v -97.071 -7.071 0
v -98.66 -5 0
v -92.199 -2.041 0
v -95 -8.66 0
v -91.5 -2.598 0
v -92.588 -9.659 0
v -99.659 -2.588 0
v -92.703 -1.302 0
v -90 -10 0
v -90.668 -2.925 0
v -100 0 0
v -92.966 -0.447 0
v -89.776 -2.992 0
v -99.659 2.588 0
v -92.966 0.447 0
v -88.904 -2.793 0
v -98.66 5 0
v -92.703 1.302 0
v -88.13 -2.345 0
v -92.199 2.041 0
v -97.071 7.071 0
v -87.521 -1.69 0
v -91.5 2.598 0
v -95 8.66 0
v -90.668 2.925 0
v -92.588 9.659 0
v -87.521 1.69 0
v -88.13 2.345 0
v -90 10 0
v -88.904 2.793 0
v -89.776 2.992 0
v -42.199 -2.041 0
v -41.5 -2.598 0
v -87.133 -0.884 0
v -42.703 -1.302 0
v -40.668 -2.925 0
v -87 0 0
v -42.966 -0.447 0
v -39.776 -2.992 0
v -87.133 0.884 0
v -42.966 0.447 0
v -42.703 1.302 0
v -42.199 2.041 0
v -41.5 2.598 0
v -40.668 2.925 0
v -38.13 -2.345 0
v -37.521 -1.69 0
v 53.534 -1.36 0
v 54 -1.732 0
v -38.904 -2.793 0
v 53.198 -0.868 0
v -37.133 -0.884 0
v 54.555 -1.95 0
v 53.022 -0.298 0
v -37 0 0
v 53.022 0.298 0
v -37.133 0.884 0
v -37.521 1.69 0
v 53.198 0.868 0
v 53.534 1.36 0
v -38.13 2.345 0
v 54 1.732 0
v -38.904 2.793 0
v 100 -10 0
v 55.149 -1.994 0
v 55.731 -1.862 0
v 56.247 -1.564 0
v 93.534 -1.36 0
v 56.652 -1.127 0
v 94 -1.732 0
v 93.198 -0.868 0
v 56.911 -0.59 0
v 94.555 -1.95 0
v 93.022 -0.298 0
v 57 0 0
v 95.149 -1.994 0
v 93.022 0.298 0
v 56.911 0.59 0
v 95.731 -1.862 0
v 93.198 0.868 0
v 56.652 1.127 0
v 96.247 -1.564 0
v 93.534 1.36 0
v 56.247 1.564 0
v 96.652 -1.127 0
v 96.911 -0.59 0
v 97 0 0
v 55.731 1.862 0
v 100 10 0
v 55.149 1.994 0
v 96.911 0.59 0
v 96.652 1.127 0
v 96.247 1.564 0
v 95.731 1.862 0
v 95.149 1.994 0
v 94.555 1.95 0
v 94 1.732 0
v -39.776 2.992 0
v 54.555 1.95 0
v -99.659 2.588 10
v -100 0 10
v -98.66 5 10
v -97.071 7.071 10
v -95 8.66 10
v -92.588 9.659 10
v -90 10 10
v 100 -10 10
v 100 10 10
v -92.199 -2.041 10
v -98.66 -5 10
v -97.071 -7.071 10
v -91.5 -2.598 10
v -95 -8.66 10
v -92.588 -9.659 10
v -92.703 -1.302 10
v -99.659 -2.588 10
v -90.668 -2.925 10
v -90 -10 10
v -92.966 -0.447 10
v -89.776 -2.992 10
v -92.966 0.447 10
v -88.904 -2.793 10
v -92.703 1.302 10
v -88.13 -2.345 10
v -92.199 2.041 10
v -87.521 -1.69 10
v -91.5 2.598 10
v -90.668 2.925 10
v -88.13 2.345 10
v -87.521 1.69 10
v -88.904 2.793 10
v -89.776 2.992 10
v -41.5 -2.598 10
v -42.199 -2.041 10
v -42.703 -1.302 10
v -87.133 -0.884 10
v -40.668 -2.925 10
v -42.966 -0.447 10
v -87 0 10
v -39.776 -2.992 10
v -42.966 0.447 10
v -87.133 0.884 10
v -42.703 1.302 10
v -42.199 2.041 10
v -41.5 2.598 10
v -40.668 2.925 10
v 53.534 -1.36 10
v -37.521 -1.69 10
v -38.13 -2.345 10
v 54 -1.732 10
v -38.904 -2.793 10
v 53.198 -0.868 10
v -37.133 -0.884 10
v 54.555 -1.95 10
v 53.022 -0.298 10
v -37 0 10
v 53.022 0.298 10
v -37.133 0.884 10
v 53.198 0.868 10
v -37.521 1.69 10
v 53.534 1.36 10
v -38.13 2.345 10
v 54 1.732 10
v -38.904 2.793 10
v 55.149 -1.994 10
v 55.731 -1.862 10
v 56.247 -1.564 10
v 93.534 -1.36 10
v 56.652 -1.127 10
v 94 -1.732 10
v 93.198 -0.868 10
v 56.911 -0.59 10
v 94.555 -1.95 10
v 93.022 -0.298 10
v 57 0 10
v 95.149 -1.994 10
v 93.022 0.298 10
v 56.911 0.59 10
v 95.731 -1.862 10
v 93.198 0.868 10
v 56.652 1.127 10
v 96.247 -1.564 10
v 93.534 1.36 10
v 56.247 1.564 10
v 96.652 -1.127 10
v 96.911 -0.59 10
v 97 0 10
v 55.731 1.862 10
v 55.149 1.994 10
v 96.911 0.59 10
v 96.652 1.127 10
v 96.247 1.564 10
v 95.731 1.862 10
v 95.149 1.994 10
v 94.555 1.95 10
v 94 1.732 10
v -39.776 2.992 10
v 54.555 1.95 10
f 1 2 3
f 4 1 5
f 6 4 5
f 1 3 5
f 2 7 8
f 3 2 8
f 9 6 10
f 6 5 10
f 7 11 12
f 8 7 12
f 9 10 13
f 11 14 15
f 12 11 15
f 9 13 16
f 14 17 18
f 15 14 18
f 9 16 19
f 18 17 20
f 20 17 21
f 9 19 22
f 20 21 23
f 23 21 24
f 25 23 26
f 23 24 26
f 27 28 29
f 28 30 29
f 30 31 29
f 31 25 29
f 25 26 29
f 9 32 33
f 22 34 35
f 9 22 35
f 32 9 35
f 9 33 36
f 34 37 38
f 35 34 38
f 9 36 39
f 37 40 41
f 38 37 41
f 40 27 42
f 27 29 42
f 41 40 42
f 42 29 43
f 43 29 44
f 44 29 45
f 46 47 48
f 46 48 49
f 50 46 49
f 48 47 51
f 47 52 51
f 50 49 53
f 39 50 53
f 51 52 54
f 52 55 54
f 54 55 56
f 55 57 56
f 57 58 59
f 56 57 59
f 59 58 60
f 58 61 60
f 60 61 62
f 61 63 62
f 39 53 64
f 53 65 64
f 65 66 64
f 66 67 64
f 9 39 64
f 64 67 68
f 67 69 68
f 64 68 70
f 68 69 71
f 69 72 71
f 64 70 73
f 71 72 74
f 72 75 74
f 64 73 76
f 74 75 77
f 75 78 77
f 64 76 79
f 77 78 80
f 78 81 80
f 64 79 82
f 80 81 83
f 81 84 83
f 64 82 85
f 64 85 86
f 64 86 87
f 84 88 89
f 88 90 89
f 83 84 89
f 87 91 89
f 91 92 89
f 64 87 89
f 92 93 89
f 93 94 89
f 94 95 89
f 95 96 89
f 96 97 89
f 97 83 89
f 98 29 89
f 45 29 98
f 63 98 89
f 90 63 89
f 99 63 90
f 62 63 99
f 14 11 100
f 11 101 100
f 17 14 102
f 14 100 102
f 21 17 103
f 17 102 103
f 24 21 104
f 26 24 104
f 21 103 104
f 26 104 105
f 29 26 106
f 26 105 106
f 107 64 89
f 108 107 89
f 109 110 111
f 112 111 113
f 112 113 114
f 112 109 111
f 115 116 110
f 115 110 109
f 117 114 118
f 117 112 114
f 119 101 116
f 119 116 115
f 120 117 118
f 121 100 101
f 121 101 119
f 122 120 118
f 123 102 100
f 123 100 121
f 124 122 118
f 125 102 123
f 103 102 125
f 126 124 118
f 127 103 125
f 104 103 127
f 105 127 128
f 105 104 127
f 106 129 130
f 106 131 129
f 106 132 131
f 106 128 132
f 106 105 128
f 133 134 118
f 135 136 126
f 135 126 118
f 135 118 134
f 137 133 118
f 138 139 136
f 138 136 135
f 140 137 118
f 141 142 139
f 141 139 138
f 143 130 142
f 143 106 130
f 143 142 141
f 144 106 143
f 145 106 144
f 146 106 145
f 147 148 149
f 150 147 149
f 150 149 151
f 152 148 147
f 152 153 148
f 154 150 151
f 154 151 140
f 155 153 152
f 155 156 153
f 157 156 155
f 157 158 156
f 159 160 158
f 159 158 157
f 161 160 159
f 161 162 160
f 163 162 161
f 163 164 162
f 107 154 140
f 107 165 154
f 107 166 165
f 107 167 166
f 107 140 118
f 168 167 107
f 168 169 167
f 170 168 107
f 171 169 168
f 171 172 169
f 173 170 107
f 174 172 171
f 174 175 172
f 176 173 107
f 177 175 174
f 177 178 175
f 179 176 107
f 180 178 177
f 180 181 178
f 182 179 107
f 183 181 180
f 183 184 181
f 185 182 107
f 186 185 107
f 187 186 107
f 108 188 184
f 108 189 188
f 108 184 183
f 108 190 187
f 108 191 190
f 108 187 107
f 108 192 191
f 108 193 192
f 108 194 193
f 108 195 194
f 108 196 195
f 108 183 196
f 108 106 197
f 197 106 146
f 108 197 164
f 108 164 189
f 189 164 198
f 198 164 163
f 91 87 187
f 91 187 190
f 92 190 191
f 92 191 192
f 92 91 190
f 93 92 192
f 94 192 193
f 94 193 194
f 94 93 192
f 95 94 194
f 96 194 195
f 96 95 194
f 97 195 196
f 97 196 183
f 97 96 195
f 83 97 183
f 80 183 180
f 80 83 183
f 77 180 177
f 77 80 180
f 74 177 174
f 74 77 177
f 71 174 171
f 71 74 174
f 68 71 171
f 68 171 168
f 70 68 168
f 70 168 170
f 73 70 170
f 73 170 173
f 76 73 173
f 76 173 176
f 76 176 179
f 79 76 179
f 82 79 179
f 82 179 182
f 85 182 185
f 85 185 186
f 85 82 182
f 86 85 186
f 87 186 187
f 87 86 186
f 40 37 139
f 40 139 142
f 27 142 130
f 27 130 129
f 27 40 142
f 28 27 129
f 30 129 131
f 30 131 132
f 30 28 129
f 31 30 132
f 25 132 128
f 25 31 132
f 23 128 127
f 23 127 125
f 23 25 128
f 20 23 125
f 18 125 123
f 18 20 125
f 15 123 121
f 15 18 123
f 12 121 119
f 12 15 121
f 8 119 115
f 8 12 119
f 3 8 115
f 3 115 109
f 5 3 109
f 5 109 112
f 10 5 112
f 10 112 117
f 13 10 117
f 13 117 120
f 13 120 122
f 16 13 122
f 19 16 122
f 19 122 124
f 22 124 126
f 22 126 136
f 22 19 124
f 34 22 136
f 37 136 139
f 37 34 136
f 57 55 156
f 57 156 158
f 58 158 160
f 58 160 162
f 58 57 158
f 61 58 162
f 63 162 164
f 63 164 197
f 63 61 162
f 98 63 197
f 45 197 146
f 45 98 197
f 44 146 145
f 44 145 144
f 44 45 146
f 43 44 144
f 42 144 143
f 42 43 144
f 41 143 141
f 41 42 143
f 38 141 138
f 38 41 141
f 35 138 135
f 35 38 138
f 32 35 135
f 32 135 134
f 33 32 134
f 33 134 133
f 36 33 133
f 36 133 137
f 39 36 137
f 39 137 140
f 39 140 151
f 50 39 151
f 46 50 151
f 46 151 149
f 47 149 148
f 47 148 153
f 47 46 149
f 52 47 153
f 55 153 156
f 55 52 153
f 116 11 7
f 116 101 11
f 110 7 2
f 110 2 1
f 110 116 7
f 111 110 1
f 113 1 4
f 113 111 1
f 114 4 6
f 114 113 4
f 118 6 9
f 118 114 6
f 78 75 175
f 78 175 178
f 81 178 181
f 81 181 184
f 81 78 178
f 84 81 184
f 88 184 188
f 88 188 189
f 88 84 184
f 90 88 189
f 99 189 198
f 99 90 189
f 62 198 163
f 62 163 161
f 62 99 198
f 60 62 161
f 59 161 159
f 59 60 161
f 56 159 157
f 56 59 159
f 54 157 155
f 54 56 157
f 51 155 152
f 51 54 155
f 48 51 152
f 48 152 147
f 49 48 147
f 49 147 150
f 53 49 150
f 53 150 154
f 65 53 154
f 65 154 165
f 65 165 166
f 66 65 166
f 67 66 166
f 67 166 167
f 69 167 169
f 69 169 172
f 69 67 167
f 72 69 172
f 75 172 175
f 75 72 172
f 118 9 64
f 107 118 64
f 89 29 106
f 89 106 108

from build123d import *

# Parameters (mm, degrees)
SKETCH1_W           = 200
SKETCH1_H           = 20
SKETCH1_R           = 3
SKETCH1_R_2         = 2
BOSS_EXTRUDE1_DEPTH = 10
FILLET1_R           = 10


with BuildPart() as part:
    # Sketch1 → Boss-Extrude1 (new body)
    with BuildSketch(Plane.XY):
        Rectangle(SKETCH1_W, SKETCH1_H)
        with Locations((-90, 0)):
            Circle(SKETCH1_R, mode=Mode.SUBTRACT)
        with Locations((-40, 0)):
            Circle(SKETCH1_R, mode=Mode.SUBTRACT)
        with Locations((95, 0)):
            Circle(SKETCH1_R_2, mode=Mode.SUBTRACT)
        with Locations((55, 0)):
            Circle(SKETCH1_R_2, mode=Mode.SUBTRACT)
    extrude(amount=BOSS_EXTRUDE1_DEPTH)

    # Fillet1
    fillet1_edges = [part.edges().sort_by_distance(p)[0] for p in [
        (-100, -10, 5),
        (-100, 10, 5),
    ]]
    fillet(fillet1_edges, radius=FILLET1_R - 0.0001)  # a hair under: the kernel refuses the full size


solid = part.part
